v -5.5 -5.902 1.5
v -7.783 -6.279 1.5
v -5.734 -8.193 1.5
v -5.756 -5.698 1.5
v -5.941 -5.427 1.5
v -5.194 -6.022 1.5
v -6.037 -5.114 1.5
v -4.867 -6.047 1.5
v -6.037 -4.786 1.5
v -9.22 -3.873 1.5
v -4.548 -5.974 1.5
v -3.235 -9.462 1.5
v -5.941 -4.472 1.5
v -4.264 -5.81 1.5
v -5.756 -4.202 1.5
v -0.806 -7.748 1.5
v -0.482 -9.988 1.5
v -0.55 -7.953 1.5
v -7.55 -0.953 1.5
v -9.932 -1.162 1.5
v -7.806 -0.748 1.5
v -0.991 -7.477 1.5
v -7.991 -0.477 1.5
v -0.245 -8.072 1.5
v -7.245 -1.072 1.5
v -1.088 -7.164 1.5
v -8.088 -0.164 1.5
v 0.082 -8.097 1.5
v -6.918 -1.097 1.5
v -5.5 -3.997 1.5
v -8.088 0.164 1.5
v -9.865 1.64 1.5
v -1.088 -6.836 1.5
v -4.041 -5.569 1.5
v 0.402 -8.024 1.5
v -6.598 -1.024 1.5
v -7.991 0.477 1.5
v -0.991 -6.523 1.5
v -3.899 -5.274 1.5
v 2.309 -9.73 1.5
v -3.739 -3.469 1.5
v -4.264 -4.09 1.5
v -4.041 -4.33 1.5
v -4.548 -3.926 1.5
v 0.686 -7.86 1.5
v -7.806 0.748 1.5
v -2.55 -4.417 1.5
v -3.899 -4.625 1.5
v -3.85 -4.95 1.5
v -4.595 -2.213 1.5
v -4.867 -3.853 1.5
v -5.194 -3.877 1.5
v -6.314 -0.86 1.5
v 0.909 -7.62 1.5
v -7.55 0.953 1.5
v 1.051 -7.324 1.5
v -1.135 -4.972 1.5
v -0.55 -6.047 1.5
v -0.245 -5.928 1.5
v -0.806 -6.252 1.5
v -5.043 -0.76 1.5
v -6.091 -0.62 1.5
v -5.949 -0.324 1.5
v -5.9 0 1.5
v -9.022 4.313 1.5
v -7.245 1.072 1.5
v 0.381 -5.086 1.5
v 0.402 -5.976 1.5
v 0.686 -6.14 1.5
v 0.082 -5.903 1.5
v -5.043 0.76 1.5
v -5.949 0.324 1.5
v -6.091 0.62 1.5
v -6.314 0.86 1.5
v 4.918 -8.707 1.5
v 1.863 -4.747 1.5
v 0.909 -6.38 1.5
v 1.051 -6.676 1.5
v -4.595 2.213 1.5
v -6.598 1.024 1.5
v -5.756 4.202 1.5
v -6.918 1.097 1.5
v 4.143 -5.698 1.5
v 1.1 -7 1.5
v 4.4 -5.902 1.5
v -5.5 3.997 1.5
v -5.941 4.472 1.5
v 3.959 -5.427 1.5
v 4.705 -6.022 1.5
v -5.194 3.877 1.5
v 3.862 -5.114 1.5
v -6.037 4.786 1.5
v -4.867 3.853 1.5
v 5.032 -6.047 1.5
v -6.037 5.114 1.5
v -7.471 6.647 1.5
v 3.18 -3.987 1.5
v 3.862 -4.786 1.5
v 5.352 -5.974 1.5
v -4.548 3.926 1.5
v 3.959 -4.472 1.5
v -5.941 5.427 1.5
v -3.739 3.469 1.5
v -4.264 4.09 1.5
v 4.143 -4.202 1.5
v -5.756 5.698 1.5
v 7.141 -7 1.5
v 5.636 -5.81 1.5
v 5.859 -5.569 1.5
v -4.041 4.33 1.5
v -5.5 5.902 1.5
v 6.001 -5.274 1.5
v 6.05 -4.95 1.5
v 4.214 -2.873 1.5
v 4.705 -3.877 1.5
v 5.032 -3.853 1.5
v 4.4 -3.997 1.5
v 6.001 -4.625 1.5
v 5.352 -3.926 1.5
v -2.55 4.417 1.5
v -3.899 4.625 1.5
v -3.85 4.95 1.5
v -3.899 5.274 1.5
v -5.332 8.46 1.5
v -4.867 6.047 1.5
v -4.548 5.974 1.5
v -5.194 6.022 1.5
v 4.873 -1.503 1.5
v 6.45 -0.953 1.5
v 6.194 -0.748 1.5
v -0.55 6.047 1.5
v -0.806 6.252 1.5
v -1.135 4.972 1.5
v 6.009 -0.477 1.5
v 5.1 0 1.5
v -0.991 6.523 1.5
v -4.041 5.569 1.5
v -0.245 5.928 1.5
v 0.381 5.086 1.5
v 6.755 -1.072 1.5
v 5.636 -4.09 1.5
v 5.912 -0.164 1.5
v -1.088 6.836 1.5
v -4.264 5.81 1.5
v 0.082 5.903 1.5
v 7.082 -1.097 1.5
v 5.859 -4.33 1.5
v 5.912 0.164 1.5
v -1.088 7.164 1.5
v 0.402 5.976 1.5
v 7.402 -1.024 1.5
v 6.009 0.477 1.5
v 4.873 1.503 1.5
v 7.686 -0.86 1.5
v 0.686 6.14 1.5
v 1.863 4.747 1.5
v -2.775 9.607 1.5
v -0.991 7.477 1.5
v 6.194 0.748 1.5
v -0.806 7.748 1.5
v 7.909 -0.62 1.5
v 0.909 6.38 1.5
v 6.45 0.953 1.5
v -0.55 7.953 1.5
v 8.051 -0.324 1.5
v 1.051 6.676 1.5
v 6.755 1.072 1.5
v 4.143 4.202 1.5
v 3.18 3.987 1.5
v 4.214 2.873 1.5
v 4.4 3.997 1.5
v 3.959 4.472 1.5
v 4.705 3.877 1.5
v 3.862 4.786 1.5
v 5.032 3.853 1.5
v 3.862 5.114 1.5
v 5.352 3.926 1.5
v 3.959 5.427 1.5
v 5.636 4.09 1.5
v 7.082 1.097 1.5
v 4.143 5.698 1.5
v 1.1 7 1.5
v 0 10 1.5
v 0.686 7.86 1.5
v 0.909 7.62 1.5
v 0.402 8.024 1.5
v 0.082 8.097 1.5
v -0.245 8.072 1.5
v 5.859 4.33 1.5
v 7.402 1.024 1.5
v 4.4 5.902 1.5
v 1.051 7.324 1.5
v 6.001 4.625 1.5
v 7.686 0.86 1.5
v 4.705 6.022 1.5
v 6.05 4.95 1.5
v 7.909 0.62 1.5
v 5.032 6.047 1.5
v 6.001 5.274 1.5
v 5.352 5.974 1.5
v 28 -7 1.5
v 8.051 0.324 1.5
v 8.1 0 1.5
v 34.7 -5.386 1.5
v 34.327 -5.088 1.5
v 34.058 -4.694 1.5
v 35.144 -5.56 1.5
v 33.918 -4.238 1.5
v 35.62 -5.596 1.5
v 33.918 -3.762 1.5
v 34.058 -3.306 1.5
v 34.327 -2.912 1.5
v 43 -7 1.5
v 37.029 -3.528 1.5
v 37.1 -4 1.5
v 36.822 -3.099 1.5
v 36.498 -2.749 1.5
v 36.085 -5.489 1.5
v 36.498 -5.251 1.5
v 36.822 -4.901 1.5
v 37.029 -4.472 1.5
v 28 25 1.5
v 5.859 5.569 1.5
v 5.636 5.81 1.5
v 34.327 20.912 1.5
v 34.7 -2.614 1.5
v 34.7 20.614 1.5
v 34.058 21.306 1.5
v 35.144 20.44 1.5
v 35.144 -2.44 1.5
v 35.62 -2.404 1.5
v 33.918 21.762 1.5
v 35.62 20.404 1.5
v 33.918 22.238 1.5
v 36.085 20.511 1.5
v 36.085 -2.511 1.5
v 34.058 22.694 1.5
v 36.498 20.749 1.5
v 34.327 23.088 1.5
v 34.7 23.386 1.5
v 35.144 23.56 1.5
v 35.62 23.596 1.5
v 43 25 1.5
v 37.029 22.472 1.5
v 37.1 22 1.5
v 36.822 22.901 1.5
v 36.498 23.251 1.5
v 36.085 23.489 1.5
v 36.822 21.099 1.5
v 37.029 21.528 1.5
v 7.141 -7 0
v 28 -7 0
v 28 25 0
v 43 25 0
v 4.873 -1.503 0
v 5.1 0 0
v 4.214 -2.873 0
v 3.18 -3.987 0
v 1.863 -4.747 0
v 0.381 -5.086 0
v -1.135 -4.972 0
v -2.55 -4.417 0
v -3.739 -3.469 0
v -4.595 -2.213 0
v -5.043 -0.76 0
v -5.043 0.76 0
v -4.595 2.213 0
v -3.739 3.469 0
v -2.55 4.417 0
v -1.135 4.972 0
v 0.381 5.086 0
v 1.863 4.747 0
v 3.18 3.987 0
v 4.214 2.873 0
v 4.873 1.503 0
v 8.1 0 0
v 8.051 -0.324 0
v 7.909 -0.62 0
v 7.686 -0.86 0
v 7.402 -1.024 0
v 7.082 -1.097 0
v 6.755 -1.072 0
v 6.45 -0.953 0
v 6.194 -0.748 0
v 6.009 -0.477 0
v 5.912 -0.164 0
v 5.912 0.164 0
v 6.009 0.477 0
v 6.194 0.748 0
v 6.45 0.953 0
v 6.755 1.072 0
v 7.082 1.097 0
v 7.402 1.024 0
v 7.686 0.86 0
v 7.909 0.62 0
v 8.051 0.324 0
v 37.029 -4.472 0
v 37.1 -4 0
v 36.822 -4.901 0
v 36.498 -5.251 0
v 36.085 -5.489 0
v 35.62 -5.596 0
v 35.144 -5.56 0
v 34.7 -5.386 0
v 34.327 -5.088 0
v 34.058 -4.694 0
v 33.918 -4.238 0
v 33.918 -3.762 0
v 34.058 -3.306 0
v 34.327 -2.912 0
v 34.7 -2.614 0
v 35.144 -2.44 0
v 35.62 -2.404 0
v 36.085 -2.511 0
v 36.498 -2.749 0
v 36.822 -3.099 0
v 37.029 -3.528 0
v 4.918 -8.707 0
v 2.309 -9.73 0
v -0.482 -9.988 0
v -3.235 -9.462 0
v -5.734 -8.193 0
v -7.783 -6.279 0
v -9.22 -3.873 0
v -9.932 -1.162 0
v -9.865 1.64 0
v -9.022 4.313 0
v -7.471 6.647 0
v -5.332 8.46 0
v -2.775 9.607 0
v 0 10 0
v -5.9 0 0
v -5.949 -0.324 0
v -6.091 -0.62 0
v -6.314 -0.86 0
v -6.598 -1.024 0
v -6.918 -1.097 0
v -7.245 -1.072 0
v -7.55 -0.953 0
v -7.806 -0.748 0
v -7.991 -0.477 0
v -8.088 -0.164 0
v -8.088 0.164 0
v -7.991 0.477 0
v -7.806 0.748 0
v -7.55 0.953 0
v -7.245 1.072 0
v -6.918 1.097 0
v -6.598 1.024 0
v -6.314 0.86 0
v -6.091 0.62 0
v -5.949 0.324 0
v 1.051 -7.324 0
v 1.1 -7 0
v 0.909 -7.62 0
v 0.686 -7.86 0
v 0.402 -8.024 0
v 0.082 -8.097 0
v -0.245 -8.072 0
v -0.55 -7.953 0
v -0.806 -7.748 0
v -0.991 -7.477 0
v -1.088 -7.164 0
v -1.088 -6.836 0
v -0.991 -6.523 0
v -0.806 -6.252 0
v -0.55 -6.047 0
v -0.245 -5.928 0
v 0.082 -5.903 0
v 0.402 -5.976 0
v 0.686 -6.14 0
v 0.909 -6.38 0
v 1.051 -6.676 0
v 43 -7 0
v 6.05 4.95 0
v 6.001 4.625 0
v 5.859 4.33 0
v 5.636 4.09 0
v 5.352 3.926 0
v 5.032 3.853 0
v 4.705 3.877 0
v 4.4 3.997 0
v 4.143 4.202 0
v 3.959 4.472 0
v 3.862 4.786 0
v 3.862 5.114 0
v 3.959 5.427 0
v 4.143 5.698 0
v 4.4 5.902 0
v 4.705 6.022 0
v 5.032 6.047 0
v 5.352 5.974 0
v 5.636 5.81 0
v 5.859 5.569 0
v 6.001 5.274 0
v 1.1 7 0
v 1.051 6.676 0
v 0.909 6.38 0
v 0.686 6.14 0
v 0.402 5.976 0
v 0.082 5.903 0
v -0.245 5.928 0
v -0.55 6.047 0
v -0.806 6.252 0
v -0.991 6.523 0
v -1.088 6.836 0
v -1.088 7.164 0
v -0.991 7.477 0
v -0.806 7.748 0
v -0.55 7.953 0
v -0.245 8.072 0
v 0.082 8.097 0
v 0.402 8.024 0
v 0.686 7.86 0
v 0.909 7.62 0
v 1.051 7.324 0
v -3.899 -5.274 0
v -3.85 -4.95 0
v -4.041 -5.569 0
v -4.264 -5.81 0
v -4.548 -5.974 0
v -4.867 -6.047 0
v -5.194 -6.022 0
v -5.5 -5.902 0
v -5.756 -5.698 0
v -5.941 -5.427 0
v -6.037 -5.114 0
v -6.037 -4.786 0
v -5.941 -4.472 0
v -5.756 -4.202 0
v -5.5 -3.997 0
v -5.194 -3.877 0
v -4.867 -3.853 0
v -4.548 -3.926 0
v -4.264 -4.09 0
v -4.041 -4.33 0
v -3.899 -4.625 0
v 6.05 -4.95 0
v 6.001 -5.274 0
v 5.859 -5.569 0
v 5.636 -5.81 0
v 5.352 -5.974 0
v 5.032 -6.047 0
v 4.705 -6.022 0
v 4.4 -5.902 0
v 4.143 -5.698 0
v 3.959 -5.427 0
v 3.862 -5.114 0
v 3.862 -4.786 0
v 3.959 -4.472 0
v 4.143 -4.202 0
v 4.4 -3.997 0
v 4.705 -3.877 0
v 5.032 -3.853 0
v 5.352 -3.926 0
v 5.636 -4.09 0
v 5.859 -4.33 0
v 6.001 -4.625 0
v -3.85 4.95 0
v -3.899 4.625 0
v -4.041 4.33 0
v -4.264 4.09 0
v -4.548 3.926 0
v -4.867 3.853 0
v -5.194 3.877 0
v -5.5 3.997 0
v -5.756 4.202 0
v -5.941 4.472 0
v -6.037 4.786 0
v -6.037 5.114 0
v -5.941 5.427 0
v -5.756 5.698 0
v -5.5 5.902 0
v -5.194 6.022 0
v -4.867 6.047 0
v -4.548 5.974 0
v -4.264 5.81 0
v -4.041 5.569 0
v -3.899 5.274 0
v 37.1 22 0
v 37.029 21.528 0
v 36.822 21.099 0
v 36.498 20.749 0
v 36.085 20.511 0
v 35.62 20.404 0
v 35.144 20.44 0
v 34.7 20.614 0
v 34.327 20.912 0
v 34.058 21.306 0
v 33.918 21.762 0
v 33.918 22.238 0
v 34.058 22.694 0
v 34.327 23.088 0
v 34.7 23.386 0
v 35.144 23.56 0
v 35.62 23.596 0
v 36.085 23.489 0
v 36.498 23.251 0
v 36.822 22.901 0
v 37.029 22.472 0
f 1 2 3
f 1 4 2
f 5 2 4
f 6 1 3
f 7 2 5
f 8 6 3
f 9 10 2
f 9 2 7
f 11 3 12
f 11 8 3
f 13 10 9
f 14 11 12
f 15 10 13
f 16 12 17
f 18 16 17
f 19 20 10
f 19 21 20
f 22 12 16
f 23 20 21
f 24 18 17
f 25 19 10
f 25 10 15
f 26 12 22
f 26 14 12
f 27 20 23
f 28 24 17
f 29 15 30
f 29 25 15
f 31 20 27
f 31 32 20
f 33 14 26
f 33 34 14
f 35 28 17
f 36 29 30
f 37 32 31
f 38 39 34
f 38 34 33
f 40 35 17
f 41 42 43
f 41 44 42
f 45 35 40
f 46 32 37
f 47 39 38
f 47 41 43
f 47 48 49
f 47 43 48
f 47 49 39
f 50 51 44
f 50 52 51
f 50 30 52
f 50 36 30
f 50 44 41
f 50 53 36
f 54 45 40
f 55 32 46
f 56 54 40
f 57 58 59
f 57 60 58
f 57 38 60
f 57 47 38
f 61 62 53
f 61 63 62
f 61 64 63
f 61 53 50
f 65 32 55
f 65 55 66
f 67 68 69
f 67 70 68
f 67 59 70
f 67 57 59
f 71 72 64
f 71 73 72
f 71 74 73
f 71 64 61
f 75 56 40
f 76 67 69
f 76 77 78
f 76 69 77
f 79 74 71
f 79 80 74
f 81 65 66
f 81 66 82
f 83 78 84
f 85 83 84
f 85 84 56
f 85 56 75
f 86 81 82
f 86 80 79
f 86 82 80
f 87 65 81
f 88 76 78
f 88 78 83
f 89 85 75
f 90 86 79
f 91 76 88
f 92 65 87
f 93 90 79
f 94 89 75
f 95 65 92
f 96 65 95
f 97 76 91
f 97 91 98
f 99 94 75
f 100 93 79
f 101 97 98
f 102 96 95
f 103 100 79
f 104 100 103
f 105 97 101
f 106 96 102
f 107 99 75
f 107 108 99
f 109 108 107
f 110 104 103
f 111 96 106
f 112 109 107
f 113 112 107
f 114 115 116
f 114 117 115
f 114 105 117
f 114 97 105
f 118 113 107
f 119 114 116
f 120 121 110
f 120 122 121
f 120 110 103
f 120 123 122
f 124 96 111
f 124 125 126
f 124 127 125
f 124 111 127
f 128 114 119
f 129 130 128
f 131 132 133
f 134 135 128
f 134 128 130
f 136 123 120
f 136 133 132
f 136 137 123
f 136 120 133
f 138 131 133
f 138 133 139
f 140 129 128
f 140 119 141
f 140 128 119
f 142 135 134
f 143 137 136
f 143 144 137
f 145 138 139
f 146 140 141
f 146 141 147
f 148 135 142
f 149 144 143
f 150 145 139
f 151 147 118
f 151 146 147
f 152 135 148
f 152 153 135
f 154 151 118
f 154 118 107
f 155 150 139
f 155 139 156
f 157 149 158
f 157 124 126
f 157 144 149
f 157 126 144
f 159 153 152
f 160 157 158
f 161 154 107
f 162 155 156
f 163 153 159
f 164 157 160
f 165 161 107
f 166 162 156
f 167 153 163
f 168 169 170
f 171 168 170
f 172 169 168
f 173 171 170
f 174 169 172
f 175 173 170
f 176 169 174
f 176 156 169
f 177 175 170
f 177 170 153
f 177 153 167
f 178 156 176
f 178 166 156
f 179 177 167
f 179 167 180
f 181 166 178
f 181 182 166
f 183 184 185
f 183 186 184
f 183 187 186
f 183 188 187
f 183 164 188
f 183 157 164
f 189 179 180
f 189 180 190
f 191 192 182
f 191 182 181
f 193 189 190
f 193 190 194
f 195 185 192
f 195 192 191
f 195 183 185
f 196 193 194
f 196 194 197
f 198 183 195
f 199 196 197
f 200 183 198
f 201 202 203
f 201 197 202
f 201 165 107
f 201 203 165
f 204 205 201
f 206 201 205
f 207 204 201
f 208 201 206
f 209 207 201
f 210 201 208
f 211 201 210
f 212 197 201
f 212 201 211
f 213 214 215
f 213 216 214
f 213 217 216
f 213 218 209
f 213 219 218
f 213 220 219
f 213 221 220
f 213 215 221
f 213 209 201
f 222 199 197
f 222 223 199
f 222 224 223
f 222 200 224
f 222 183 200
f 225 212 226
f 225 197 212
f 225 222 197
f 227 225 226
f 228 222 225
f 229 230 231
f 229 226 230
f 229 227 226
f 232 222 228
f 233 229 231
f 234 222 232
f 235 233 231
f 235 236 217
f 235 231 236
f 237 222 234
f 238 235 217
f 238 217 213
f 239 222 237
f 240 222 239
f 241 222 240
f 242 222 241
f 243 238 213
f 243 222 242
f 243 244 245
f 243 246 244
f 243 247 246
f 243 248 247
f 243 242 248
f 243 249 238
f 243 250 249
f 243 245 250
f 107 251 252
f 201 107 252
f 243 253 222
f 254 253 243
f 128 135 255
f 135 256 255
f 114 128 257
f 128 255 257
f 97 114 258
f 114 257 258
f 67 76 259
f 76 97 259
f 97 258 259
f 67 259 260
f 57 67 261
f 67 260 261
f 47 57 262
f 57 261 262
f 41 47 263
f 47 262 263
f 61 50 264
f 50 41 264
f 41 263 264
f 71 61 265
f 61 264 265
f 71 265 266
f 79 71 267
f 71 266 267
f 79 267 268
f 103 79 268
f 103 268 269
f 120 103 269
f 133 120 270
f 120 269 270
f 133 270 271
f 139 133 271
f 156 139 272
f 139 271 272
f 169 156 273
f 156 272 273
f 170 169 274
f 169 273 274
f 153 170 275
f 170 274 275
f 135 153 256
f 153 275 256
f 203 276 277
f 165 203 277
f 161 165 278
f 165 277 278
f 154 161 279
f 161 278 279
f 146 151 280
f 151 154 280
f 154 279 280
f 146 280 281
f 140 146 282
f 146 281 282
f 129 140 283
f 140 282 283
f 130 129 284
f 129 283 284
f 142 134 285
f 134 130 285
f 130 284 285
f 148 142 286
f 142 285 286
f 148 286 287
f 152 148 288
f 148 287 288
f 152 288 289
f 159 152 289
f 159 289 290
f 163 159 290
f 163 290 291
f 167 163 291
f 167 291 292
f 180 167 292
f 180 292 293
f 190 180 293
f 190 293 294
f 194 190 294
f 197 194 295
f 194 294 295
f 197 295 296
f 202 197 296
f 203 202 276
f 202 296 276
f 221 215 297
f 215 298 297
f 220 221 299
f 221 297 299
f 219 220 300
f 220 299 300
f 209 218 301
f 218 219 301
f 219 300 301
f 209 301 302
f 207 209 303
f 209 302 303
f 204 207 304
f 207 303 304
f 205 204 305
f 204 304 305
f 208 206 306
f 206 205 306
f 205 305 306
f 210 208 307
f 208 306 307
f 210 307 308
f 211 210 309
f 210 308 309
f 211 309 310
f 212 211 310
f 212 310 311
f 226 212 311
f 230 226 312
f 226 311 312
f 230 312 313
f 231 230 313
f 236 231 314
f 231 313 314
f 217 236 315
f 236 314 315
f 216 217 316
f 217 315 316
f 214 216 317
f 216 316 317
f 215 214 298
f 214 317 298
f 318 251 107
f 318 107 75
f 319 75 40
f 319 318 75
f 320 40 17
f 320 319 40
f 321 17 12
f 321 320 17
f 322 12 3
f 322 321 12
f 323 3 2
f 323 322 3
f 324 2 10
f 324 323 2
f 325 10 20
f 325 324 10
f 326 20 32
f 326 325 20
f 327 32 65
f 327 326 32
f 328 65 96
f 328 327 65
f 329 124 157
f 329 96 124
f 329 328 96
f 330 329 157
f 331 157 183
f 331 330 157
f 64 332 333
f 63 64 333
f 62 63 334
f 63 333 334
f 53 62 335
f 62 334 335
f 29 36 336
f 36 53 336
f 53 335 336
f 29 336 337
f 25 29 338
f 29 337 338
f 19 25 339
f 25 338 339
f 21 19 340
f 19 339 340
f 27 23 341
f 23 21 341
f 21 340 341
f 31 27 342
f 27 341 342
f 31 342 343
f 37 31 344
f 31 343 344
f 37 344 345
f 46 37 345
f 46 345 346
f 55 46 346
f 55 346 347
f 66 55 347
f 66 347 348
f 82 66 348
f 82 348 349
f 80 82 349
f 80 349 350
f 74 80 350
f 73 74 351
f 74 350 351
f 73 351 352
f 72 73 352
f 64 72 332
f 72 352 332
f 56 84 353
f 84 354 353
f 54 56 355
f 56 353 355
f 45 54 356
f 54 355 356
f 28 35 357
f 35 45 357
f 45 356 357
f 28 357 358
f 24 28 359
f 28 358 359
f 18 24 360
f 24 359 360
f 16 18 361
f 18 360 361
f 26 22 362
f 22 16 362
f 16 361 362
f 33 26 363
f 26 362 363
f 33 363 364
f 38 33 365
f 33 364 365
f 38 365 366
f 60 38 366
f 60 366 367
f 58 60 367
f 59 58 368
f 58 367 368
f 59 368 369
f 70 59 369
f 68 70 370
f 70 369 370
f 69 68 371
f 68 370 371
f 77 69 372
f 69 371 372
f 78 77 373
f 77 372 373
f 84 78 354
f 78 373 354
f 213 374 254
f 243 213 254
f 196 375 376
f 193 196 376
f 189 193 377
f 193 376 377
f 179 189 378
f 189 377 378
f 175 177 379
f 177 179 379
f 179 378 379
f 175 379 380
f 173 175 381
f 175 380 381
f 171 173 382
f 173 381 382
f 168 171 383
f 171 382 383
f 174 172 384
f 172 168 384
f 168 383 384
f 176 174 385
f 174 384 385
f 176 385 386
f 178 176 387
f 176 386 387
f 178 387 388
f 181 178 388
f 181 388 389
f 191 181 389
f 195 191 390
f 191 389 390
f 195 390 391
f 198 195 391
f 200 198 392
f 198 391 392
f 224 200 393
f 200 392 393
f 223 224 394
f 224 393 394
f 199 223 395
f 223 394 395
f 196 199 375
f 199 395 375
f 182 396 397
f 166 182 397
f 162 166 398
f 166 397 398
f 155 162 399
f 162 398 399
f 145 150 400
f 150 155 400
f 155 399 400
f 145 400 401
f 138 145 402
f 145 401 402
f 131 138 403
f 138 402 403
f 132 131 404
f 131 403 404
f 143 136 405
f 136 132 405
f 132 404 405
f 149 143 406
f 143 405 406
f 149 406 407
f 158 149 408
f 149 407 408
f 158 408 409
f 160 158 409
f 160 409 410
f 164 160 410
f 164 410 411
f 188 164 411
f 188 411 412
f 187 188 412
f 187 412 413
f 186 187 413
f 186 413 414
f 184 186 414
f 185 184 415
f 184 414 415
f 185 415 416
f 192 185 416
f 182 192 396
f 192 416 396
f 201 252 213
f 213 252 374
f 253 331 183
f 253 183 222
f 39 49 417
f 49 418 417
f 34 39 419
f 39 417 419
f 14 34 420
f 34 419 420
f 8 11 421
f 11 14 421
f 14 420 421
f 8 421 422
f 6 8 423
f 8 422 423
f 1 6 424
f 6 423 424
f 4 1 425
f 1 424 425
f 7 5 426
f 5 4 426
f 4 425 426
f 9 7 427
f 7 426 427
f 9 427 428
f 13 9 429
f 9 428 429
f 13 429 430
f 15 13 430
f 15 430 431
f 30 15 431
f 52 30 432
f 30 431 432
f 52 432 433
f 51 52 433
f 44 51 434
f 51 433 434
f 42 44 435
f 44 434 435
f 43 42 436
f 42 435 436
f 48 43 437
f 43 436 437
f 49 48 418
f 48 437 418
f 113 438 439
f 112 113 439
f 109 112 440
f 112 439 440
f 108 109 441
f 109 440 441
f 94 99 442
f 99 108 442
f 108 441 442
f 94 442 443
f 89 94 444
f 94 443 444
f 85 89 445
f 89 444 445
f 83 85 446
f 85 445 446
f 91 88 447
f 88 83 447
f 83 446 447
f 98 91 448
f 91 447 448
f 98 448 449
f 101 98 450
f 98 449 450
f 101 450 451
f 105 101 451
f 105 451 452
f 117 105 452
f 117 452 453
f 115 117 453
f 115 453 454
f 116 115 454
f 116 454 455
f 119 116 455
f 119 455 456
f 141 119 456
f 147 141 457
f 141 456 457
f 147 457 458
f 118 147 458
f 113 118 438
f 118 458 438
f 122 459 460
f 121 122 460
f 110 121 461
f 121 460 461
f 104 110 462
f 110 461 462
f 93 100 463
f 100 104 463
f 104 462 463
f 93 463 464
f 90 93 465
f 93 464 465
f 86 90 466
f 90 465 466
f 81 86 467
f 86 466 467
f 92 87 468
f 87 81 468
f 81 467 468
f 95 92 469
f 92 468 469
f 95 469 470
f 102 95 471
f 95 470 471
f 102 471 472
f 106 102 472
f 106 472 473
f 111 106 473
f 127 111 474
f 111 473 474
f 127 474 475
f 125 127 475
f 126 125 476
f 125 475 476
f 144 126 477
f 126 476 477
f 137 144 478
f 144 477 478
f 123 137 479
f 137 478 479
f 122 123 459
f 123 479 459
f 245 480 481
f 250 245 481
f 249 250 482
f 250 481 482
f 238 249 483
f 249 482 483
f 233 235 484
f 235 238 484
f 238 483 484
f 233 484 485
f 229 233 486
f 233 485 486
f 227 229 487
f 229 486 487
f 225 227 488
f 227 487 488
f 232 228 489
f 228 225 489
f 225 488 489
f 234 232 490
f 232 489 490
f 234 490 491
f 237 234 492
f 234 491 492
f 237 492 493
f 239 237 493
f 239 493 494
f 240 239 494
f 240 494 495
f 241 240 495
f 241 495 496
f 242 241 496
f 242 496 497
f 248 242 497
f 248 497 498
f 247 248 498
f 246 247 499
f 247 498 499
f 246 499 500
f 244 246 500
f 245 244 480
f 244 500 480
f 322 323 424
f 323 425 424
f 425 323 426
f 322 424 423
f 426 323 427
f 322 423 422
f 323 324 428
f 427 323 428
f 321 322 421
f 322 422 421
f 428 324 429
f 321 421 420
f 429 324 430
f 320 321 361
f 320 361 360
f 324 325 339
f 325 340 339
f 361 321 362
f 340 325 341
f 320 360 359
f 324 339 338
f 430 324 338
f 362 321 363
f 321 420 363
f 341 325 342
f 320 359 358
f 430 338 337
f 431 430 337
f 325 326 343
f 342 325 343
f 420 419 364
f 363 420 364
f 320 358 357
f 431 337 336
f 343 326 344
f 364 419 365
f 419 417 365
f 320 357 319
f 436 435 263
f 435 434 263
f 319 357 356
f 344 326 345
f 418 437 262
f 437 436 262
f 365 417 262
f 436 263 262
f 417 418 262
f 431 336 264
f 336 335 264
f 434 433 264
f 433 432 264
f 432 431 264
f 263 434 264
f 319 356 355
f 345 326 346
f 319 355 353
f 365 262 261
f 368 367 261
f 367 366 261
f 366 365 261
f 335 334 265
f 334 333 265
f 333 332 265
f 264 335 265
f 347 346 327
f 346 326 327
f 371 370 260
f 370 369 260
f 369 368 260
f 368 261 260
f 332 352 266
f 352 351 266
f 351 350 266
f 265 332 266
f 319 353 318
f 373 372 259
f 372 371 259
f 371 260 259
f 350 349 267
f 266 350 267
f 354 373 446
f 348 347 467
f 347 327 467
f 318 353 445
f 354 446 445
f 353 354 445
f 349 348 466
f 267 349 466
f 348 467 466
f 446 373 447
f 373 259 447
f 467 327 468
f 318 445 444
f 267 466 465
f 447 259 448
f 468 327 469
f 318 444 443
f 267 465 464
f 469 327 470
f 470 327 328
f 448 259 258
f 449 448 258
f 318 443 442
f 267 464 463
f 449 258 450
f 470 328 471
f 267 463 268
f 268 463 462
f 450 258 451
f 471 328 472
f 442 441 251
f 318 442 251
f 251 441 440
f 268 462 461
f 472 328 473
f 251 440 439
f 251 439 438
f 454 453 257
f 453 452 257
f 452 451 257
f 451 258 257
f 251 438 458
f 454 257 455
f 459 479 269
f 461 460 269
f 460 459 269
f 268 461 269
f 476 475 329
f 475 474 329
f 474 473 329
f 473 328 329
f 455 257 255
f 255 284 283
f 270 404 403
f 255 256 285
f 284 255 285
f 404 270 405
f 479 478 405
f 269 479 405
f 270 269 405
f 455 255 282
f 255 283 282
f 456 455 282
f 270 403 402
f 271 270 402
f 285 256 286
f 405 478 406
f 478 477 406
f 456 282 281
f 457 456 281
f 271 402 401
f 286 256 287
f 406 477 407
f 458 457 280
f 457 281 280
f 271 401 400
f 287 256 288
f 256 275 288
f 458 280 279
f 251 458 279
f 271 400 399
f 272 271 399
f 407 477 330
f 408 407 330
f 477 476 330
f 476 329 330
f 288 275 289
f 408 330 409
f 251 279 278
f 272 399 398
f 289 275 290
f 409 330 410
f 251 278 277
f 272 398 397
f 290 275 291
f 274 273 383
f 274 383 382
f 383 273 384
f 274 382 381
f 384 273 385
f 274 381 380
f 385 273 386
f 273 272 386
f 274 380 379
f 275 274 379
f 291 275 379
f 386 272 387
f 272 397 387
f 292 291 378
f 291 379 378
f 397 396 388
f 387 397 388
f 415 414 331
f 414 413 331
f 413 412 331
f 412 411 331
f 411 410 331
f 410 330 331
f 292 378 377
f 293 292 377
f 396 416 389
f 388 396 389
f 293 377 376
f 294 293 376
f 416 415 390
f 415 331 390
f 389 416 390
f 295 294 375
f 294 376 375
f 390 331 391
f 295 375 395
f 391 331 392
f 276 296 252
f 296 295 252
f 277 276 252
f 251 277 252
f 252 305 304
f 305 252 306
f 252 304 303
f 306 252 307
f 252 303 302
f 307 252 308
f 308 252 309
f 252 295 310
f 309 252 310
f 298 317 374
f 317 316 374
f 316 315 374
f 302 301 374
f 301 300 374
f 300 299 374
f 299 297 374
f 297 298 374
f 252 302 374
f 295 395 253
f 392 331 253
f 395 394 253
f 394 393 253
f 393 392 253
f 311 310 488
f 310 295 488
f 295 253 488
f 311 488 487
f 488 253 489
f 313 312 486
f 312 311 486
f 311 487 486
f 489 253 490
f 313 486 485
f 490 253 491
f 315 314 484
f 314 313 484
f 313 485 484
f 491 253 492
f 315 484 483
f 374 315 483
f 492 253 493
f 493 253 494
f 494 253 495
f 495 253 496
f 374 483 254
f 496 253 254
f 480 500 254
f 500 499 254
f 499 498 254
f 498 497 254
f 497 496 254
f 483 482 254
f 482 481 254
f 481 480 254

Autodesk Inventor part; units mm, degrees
ref_plane "YZ Plane" through (0, 0, 0) normal (1, 0, 0) x (0, 1, 0)
ref_plane "XZ Plane" through (0, 0, 0) normal (0, 1, 0) x (-1, 0, 0)
ref_plane "XY Plane" through (0, 0, 0) normal (0, 0, 1) x (1, 0, 0)
sketch "スケッチ1" plane through (0, 0, 0) normal (0, 0, 1) x (1, 0, 0)
  arc A0 (0, 10) -> (7.1414, -7) centre (0, 0) ccw
  circle A1 centre (0, 0) radius 7 construction
  circle A2 centre (0, 7) radius 1.1
  circle A3 centre (0, 0) radius 7 construction
  circle A4 centre (-4.9497, 4.9497) radius 1.1
  circle A5 centre (0, 0) radius 7 construction
  circle A6 centre (-7, 0) radius 1.1
  circle A7 centre (0, 0) radius 7 construction
  circle A8 centre (-4.9497, -4.9497) radius 1.1
  circle A9 centre (0, 0) radius 7 construction
  circle A10 centre (0, -7) radius 1.1
  circle A11 centre (0, 0) radius 7 construction
  circle A12 centre (4.9497, -4.9497) radius 1.1
  circle A13 centre (0, 0) radius 7 construction
  circle A14 centre (7, 0) radius 1.1
  circle A15 centre (0, 0) radius 7 construction
  circle A16 centre (4.9497, 4.9497) radius 1.1
  line L0 (0, 10) -> (28, 25)
  circle A17 centre (0, 0) radius 5.1
  line L1 (43, -7) -> (43, 25)
  line L2 (7.1414, -7) -> (43, -7)
  line L3 (43, -7) -> (28, -7)
  line L4 (28, -7) -> (28, 25) construction
  line L5 (28, 25) -> (43, 25)
  line L6 (35.5, 25) -> (35.5, -7) construction
  line L7 (43, 9) -> (28, 9) construction
  circle A18 centre (35.5, 22) radius 1.6
  circle A19 centre (35.5, -4) radius 1.6
  line L8 (0, 0) -> (-10, 0) construction
  circle A20 centre (35.5, 22) radius 3 construction
  circle A21 centre (35.5, -4) radius 3 construction
  circle A22 centre (35.5, 15) radius 1.6 construction
  circle A23 centre (35.5, 15) radius 3 construction
  circle A24 centre (35.5, 3) radius 1.6 construction
  circle A25 centre (35.5, 3) radius 3 construction
  line L9 (0, 0) -> (0, 10) construction
  dimension "d1" = 14
  dimension "d0" = 20
  dimension "d2" = 2.2
  dimension "d5" = 360
  dimension "d7" = 10.2
  dimension "d11" = 15
  dimension "d12" = 90
  dimension "d13" = 3.2
  dimension "d14" = 3.2
  dimension "d15" = 35.8586
  dimension "d16" = 7
  dimension "d18" = 6
  dimension "d19" = 6
  dimension "d20" = 3.2
  dimension "d21" = 6
  dimension "d22" = 6
  dimension "d23" = 32
extrude "押し出し1" add sketch "スケッチ1" along normal blind 1.5
properties part number "サーボ支え板A_アルミ(A2017)_t1.5" material "アルミニウム 6061"
